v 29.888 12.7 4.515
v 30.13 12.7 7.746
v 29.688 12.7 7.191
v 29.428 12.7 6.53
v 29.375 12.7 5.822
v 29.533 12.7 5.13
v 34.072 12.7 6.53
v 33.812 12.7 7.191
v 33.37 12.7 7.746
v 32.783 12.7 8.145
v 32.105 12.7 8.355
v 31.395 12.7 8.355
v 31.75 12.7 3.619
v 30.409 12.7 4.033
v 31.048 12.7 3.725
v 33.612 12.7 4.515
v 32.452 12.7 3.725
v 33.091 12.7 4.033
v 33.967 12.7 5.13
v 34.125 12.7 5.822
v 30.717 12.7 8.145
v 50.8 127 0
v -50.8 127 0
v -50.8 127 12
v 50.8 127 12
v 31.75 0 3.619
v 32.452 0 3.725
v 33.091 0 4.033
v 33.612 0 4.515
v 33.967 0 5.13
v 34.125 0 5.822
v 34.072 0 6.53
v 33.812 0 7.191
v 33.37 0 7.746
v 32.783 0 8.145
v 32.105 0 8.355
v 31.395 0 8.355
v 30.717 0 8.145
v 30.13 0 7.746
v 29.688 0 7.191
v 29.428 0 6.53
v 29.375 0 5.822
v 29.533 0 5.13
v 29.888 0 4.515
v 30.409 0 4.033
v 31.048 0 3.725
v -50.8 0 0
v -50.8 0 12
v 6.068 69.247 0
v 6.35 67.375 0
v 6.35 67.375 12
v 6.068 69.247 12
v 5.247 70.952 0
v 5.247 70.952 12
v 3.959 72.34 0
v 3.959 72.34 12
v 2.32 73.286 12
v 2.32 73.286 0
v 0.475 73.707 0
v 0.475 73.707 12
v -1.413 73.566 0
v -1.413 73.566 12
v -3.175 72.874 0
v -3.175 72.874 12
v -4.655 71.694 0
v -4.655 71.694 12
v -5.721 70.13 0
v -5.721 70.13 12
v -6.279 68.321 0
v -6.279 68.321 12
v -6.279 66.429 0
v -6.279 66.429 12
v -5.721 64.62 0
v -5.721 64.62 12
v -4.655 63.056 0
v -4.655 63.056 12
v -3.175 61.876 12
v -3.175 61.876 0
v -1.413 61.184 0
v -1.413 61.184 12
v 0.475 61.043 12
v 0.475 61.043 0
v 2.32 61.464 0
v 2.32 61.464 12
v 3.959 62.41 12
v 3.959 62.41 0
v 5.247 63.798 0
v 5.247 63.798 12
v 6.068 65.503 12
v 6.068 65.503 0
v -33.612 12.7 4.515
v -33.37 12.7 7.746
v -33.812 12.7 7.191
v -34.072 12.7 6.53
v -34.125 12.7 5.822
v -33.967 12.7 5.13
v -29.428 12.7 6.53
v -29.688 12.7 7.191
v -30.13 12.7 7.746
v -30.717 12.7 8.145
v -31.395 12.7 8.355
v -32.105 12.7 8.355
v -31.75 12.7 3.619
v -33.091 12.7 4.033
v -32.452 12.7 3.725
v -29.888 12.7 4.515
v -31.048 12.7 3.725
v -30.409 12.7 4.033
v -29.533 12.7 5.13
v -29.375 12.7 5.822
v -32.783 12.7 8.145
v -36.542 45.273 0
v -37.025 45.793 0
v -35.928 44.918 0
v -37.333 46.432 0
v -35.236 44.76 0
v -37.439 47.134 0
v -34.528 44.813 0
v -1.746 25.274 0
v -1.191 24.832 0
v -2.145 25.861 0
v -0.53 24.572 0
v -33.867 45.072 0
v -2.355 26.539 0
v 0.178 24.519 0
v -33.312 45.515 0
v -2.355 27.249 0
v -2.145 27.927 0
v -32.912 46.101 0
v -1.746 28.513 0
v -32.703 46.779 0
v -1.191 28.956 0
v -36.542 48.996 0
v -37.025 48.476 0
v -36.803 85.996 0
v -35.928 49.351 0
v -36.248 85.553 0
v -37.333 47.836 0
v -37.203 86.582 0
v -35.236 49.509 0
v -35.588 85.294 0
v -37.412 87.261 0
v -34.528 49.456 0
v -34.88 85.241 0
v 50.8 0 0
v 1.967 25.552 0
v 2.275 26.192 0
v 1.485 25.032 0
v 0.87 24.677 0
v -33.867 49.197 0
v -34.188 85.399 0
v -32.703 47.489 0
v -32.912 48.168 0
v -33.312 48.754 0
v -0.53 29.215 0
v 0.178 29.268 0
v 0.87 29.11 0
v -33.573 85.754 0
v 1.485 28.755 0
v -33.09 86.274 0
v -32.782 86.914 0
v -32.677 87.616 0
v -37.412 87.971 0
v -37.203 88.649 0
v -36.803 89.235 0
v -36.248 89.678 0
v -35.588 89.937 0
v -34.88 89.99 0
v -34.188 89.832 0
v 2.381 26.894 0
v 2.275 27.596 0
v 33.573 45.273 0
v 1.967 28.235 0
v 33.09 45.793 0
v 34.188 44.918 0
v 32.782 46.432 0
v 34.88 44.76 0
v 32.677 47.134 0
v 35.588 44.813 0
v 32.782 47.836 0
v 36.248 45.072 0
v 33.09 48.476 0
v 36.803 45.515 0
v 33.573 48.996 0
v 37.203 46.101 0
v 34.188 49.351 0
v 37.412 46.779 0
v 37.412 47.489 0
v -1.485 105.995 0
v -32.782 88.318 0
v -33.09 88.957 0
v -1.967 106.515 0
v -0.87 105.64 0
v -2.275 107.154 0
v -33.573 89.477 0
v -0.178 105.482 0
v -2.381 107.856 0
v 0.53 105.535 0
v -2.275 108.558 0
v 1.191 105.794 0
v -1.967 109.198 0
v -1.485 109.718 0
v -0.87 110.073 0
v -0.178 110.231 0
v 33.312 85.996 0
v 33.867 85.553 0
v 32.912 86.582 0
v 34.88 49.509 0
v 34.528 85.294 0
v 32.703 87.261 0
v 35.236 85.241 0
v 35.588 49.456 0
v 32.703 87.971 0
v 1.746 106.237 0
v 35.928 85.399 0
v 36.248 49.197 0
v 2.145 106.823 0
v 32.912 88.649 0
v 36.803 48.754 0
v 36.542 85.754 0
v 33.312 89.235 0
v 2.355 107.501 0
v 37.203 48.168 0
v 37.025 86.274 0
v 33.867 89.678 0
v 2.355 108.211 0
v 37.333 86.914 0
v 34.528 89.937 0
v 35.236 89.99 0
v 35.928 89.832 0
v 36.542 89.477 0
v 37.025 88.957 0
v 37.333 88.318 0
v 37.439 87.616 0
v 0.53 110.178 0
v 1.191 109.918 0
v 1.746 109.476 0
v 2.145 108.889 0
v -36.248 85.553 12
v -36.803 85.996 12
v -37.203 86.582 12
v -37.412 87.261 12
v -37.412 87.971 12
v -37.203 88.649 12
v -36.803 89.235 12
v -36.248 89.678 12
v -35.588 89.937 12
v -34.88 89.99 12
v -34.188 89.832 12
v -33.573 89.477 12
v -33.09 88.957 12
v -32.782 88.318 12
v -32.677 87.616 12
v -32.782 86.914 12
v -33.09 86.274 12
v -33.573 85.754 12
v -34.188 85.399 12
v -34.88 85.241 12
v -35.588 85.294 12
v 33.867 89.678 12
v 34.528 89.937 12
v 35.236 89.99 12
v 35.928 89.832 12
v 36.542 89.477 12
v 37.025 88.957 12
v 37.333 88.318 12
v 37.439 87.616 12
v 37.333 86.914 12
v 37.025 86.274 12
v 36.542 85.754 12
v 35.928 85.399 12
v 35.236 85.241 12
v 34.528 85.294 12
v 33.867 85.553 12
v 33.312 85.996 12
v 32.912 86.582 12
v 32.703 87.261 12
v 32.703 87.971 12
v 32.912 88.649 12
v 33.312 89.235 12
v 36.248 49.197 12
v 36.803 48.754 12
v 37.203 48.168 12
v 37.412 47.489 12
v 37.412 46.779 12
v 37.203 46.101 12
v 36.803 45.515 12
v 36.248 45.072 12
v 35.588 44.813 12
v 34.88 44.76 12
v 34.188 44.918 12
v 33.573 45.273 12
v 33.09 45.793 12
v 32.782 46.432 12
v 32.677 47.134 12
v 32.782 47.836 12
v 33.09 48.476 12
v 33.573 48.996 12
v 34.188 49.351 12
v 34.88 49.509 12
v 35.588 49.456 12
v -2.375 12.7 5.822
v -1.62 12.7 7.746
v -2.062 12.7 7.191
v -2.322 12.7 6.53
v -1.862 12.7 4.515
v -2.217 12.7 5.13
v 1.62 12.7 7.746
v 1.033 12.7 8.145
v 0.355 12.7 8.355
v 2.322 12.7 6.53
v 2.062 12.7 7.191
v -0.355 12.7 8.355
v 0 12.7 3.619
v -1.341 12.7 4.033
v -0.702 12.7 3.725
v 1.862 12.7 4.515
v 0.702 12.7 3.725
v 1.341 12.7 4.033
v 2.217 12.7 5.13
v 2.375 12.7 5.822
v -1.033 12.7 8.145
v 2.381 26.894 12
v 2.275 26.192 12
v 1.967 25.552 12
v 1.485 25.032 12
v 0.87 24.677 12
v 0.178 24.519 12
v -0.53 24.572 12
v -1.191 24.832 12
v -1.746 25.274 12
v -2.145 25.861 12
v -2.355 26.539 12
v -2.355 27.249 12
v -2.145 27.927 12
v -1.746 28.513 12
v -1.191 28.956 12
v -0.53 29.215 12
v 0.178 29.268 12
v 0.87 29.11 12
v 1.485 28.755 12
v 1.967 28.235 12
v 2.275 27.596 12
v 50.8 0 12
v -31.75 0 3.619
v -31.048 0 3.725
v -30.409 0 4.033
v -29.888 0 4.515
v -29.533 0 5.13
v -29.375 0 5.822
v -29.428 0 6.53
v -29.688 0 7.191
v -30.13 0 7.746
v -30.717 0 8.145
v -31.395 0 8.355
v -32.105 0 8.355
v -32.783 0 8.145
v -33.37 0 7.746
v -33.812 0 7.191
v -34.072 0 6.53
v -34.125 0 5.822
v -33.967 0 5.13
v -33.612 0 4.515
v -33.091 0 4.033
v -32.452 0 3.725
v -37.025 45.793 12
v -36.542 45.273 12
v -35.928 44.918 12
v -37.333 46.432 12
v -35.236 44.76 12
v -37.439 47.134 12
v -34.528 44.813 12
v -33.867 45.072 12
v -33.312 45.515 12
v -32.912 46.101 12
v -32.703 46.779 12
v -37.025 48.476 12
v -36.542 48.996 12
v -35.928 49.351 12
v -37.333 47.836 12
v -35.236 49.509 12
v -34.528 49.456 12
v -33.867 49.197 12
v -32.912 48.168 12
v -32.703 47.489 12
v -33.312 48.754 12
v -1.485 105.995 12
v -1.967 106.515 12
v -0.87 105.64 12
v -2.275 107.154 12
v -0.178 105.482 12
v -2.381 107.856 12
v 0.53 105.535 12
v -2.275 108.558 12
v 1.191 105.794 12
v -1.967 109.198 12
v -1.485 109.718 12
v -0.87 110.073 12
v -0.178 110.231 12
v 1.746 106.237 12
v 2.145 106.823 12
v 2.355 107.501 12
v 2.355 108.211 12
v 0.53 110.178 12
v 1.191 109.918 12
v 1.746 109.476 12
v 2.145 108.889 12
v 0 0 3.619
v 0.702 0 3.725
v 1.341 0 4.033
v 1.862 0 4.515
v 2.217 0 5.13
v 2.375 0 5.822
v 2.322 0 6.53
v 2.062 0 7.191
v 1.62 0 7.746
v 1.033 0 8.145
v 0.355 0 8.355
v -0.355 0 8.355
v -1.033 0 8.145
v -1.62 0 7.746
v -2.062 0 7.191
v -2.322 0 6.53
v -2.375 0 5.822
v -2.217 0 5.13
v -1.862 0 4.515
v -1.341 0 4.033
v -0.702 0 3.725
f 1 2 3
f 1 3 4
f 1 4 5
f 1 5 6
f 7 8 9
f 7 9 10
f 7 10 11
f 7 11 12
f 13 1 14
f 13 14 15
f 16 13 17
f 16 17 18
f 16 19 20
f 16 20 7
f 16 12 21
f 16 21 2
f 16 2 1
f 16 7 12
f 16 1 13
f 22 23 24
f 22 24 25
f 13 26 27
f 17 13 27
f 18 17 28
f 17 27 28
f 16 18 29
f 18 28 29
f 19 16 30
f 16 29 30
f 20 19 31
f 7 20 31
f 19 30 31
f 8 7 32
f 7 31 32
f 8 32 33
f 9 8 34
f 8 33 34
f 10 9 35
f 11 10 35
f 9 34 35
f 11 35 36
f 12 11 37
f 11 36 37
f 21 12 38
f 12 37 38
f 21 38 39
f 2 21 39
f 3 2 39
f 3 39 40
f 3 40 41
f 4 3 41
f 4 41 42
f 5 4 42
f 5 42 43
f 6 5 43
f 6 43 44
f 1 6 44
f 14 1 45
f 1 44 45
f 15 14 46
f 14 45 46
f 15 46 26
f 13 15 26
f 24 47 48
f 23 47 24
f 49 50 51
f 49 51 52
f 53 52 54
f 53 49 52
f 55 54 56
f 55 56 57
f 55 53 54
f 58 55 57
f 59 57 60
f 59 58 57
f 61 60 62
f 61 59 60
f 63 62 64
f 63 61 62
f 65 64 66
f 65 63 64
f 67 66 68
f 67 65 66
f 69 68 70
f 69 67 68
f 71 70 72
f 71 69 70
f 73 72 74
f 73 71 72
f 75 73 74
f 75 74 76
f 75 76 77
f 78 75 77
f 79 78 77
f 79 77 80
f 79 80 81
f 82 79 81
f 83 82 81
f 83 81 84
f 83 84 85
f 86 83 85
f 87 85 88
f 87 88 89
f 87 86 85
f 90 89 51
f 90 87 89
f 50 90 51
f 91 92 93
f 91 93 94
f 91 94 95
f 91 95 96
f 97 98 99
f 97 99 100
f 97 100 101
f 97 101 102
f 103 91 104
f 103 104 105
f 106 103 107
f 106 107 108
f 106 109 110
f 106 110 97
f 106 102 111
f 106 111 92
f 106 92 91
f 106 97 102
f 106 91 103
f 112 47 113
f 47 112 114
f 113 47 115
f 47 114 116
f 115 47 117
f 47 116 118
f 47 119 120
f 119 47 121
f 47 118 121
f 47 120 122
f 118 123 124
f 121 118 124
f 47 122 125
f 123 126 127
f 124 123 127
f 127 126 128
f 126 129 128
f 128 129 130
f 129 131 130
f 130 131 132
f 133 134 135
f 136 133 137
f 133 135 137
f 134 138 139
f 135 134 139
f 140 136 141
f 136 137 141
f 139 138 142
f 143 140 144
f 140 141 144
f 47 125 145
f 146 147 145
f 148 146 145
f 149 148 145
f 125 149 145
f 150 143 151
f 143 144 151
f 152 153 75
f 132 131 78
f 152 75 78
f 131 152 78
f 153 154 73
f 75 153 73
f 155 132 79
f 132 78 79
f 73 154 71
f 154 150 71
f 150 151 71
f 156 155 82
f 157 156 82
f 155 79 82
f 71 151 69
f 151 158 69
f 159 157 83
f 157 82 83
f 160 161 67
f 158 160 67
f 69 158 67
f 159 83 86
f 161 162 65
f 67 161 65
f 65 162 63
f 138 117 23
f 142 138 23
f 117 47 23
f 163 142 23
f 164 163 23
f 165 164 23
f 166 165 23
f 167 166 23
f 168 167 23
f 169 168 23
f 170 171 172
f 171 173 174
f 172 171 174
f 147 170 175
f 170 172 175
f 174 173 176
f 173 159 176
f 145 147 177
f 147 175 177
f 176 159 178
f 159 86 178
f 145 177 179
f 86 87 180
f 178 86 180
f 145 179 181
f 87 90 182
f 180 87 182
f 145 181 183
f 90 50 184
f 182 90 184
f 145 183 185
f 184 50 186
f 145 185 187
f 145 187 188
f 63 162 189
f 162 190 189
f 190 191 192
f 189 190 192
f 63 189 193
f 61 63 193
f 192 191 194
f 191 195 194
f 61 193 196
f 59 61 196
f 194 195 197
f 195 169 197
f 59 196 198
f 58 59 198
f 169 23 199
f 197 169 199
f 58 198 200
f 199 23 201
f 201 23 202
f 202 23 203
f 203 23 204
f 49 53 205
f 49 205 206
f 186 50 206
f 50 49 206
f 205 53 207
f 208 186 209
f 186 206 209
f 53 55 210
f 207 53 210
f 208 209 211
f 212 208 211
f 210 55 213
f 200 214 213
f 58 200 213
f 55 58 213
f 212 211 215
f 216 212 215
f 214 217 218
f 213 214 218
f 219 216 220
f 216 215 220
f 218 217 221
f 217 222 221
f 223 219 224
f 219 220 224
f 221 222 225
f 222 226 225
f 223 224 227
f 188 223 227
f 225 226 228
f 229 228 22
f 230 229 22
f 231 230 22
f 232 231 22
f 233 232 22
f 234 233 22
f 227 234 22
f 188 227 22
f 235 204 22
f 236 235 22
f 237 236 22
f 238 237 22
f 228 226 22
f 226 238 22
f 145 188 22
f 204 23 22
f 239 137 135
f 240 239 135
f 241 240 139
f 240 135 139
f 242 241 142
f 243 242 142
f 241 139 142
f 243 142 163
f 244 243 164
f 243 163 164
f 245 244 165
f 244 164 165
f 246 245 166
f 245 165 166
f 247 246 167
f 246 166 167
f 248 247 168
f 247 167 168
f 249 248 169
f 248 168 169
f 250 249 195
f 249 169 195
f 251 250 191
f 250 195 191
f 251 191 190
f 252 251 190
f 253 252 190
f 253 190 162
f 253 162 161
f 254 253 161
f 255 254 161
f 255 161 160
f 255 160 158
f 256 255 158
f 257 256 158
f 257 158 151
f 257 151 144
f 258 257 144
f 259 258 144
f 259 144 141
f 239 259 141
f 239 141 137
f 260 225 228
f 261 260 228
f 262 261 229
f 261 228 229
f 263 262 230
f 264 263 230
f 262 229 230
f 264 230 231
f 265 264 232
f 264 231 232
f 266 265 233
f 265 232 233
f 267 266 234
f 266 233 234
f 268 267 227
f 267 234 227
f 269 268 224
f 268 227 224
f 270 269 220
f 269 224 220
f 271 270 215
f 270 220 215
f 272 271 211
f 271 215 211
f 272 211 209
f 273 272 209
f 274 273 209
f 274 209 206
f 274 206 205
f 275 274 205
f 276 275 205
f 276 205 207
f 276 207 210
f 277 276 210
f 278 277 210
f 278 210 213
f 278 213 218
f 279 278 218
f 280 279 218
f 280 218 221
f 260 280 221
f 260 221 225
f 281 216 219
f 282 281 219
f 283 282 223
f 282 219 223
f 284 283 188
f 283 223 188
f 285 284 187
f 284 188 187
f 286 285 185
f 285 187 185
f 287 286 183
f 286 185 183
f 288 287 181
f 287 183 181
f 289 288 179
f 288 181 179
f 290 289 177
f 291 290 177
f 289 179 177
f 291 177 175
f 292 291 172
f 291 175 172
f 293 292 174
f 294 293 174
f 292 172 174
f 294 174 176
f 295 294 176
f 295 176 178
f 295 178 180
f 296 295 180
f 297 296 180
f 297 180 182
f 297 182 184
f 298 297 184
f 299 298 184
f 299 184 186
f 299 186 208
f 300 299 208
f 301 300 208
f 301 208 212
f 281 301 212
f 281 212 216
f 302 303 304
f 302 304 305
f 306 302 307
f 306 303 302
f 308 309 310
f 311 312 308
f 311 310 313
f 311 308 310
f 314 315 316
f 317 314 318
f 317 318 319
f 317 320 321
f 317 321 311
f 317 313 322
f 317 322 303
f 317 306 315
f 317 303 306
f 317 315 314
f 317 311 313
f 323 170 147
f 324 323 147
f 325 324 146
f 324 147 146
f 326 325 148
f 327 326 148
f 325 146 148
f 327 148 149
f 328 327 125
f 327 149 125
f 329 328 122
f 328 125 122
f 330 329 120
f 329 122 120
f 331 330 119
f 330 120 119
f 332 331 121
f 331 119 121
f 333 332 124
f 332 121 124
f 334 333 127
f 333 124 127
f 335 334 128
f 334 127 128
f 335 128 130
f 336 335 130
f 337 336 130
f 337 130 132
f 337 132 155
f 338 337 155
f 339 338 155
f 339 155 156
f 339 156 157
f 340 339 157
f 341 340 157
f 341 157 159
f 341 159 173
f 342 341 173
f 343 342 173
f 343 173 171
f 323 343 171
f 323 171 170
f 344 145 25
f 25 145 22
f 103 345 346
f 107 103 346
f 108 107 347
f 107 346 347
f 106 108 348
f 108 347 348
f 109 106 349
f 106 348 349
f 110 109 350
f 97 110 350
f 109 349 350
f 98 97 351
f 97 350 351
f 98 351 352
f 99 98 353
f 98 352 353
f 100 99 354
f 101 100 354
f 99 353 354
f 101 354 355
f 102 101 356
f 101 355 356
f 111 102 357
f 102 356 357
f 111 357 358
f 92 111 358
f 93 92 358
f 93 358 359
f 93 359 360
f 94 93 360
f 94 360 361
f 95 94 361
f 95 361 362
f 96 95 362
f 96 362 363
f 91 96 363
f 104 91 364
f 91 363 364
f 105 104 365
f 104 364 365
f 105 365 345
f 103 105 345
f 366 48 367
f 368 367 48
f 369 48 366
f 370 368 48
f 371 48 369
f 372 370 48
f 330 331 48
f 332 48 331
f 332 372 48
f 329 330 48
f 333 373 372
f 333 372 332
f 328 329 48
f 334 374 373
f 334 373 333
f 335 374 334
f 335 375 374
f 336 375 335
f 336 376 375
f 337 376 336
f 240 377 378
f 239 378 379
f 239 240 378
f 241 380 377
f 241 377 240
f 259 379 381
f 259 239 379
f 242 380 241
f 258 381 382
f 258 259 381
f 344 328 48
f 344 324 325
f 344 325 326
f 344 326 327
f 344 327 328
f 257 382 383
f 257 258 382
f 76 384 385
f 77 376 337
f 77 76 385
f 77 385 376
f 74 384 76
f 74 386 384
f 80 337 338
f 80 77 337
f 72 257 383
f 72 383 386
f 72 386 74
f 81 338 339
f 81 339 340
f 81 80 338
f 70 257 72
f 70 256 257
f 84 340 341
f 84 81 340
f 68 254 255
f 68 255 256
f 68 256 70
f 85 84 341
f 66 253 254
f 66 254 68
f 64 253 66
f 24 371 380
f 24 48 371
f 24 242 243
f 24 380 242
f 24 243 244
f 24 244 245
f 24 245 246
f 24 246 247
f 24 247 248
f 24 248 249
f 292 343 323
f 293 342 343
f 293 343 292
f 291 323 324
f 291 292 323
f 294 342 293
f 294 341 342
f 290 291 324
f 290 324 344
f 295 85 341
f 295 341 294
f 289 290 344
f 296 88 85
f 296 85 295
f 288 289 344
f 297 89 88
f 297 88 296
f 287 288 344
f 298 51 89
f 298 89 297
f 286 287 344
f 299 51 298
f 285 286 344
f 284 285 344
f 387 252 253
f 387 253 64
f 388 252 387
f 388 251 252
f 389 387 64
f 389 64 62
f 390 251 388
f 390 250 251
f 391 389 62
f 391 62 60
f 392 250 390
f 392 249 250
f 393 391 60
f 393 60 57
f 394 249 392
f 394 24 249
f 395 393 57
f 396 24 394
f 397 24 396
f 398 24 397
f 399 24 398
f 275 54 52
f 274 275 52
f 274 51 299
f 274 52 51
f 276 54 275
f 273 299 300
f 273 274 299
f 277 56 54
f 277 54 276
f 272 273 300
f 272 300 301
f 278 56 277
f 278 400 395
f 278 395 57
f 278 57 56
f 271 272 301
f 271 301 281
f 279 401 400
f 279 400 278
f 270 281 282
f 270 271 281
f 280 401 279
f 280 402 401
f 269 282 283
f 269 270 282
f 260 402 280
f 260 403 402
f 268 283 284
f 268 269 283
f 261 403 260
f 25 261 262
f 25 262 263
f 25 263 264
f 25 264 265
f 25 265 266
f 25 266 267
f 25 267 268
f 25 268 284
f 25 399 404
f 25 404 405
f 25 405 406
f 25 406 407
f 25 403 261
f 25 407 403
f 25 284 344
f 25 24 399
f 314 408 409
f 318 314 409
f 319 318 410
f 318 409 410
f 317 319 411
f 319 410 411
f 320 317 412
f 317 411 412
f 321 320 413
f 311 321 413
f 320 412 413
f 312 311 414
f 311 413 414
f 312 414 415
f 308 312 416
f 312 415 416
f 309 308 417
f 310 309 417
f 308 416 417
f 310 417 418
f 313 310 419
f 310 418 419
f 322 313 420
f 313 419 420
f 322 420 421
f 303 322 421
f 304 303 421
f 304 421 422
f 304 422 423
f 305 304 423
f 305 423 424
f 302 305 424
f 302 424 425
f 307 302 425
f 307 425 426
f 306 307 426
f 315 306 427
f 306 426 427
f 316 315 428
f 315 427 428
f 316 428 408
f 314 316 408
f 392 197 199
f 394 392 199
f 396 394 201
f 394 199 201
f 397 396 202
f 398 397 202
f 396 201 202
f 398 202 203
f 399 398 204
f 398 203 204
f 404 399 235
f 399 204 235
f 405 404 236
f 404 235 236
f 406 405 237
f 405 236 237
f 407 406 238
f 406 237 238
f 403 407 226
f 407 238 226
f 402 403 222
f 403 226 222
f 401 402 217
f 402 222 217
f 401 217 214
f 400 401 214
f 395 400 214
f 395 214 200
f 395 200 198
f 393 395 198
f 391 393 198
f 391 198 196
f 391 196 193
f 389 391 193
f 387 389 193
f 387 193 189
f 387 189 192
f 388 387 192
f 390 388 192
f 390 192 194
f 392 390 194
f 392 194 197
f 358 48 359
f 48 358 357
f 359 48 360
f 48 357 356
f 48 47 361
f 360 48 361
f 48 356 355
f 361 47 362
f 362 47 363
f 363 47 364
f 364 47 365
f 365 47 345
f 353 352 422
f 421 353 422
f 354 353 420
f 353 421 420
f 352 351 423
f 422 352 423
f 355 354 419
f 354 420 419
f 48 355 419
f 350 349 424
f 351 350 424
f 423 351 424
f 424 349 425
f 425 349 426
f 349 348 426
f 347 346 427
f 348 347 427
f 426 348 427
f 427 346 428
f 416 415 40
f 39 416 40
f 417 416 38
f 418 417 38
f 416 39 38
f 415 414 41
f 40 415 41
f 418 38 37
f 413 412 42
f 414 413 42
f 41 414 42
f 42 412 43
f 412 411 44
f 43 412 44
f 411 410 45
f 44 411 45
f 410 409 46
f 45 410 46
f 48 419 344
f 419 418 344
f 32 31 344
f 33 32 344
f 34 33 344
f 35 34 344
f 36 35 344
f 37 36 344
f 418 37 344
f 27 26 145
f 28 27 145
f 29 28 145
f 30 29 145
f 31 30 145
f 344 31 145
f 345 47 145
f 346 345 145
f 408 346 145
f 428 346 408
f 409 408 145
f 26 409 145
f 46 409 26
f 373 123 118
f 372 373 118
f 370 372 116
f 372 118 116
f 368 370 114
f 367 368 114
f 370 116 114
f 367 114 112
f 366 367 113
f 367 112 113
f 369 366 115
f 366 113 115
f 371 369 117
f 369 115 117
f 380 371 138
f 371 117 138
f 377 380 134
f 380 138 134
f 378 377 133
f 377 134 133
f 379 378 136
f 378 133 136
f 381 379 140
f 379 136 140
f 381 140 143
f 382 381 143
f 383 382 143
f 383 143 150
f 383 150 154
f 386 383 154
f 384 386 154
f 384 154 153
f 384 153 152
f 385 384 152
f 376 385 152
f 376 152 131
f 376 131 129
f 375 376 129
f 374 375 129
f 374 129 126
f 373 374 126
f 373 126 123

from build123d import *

# Parameters (mm, degrees)
SKETCH1_W           = 101.6
SKETCH1_H           = 127
SKETCH1_R           = 6.35
BOSS_EXTRUDE1_DEPTH = 12.0000014
SKETCH2_R           = 2.38125
CUT_EXTRUDE1_DEPTH  = 138.308557758
CIRPATTERN1_COUNT   = 6
SKETCH3_R           = 2.38125
CUT_EXTRUDE2_DEPTH  = 12.7


with BuildPart() as part:
    # Sketch1 → Boss-Extrude1 (new body)
    with BuildSketch(Plane.XY):
        with Locations((0, 63.5)):
            Rectangle(SKETCH1_W, SKETCH1_H)
        with Locations((0, 67.3749986)):
            Circle(SKETCH1_R, mode=Mode.SUBTRACT)
    extrude(amount=BOSS_EXTRUDE1_DEPTH)

    # Sketch2 → Cut-Extrude1 (cut, through all)
    with BuildSketch(Plane(origin=(0, 0, 0), x_dir=(-1, 0, 0), z_dir=(0, 0, -1))):
        with Locations((0, 107.8562486)):
            Circle(SKETCH2_R)
    cut_extrude1 = extrude(amount=-CUT_EXTRUDE1_DEPTH, mode=Mode.SUBTRACT)

    # CirPattern1: Cut-Extrude1 ×6 about axis
    cirpattern1_axis = Axis((0, 67.3749986, 0), (0, 0, 1))
    for i in range(1, CIRPATTERN1_COUNT):
        add(cut_extrude1.rotate(cirpattern1_axis, i * 360 / CIRPATTERN1_COUNT), mode=Mode.SUBTRACT)

    # Sketch3 → Cut-Extrude2 (cut)
    with BuildSketch(Plane.XZ):
        with Locations(Location((31.75, 6.0000007, 0), (0, 0, 270))):
            Circle(SKETCH3_R)
        with Locations(Location((0, 6.0000007, 0), (0, 0, 270))):
            Circle(SKETCH3_R)
        with Locations(Location((-31.75, 6.0000007, 0), (0, 0, 270))):
            Circle(SKETCH3_R)
    extrude(amount=-CUT_EXTRUDE2_DEPTH, mode=Mode.SUBTRACT)


solid = part.part
